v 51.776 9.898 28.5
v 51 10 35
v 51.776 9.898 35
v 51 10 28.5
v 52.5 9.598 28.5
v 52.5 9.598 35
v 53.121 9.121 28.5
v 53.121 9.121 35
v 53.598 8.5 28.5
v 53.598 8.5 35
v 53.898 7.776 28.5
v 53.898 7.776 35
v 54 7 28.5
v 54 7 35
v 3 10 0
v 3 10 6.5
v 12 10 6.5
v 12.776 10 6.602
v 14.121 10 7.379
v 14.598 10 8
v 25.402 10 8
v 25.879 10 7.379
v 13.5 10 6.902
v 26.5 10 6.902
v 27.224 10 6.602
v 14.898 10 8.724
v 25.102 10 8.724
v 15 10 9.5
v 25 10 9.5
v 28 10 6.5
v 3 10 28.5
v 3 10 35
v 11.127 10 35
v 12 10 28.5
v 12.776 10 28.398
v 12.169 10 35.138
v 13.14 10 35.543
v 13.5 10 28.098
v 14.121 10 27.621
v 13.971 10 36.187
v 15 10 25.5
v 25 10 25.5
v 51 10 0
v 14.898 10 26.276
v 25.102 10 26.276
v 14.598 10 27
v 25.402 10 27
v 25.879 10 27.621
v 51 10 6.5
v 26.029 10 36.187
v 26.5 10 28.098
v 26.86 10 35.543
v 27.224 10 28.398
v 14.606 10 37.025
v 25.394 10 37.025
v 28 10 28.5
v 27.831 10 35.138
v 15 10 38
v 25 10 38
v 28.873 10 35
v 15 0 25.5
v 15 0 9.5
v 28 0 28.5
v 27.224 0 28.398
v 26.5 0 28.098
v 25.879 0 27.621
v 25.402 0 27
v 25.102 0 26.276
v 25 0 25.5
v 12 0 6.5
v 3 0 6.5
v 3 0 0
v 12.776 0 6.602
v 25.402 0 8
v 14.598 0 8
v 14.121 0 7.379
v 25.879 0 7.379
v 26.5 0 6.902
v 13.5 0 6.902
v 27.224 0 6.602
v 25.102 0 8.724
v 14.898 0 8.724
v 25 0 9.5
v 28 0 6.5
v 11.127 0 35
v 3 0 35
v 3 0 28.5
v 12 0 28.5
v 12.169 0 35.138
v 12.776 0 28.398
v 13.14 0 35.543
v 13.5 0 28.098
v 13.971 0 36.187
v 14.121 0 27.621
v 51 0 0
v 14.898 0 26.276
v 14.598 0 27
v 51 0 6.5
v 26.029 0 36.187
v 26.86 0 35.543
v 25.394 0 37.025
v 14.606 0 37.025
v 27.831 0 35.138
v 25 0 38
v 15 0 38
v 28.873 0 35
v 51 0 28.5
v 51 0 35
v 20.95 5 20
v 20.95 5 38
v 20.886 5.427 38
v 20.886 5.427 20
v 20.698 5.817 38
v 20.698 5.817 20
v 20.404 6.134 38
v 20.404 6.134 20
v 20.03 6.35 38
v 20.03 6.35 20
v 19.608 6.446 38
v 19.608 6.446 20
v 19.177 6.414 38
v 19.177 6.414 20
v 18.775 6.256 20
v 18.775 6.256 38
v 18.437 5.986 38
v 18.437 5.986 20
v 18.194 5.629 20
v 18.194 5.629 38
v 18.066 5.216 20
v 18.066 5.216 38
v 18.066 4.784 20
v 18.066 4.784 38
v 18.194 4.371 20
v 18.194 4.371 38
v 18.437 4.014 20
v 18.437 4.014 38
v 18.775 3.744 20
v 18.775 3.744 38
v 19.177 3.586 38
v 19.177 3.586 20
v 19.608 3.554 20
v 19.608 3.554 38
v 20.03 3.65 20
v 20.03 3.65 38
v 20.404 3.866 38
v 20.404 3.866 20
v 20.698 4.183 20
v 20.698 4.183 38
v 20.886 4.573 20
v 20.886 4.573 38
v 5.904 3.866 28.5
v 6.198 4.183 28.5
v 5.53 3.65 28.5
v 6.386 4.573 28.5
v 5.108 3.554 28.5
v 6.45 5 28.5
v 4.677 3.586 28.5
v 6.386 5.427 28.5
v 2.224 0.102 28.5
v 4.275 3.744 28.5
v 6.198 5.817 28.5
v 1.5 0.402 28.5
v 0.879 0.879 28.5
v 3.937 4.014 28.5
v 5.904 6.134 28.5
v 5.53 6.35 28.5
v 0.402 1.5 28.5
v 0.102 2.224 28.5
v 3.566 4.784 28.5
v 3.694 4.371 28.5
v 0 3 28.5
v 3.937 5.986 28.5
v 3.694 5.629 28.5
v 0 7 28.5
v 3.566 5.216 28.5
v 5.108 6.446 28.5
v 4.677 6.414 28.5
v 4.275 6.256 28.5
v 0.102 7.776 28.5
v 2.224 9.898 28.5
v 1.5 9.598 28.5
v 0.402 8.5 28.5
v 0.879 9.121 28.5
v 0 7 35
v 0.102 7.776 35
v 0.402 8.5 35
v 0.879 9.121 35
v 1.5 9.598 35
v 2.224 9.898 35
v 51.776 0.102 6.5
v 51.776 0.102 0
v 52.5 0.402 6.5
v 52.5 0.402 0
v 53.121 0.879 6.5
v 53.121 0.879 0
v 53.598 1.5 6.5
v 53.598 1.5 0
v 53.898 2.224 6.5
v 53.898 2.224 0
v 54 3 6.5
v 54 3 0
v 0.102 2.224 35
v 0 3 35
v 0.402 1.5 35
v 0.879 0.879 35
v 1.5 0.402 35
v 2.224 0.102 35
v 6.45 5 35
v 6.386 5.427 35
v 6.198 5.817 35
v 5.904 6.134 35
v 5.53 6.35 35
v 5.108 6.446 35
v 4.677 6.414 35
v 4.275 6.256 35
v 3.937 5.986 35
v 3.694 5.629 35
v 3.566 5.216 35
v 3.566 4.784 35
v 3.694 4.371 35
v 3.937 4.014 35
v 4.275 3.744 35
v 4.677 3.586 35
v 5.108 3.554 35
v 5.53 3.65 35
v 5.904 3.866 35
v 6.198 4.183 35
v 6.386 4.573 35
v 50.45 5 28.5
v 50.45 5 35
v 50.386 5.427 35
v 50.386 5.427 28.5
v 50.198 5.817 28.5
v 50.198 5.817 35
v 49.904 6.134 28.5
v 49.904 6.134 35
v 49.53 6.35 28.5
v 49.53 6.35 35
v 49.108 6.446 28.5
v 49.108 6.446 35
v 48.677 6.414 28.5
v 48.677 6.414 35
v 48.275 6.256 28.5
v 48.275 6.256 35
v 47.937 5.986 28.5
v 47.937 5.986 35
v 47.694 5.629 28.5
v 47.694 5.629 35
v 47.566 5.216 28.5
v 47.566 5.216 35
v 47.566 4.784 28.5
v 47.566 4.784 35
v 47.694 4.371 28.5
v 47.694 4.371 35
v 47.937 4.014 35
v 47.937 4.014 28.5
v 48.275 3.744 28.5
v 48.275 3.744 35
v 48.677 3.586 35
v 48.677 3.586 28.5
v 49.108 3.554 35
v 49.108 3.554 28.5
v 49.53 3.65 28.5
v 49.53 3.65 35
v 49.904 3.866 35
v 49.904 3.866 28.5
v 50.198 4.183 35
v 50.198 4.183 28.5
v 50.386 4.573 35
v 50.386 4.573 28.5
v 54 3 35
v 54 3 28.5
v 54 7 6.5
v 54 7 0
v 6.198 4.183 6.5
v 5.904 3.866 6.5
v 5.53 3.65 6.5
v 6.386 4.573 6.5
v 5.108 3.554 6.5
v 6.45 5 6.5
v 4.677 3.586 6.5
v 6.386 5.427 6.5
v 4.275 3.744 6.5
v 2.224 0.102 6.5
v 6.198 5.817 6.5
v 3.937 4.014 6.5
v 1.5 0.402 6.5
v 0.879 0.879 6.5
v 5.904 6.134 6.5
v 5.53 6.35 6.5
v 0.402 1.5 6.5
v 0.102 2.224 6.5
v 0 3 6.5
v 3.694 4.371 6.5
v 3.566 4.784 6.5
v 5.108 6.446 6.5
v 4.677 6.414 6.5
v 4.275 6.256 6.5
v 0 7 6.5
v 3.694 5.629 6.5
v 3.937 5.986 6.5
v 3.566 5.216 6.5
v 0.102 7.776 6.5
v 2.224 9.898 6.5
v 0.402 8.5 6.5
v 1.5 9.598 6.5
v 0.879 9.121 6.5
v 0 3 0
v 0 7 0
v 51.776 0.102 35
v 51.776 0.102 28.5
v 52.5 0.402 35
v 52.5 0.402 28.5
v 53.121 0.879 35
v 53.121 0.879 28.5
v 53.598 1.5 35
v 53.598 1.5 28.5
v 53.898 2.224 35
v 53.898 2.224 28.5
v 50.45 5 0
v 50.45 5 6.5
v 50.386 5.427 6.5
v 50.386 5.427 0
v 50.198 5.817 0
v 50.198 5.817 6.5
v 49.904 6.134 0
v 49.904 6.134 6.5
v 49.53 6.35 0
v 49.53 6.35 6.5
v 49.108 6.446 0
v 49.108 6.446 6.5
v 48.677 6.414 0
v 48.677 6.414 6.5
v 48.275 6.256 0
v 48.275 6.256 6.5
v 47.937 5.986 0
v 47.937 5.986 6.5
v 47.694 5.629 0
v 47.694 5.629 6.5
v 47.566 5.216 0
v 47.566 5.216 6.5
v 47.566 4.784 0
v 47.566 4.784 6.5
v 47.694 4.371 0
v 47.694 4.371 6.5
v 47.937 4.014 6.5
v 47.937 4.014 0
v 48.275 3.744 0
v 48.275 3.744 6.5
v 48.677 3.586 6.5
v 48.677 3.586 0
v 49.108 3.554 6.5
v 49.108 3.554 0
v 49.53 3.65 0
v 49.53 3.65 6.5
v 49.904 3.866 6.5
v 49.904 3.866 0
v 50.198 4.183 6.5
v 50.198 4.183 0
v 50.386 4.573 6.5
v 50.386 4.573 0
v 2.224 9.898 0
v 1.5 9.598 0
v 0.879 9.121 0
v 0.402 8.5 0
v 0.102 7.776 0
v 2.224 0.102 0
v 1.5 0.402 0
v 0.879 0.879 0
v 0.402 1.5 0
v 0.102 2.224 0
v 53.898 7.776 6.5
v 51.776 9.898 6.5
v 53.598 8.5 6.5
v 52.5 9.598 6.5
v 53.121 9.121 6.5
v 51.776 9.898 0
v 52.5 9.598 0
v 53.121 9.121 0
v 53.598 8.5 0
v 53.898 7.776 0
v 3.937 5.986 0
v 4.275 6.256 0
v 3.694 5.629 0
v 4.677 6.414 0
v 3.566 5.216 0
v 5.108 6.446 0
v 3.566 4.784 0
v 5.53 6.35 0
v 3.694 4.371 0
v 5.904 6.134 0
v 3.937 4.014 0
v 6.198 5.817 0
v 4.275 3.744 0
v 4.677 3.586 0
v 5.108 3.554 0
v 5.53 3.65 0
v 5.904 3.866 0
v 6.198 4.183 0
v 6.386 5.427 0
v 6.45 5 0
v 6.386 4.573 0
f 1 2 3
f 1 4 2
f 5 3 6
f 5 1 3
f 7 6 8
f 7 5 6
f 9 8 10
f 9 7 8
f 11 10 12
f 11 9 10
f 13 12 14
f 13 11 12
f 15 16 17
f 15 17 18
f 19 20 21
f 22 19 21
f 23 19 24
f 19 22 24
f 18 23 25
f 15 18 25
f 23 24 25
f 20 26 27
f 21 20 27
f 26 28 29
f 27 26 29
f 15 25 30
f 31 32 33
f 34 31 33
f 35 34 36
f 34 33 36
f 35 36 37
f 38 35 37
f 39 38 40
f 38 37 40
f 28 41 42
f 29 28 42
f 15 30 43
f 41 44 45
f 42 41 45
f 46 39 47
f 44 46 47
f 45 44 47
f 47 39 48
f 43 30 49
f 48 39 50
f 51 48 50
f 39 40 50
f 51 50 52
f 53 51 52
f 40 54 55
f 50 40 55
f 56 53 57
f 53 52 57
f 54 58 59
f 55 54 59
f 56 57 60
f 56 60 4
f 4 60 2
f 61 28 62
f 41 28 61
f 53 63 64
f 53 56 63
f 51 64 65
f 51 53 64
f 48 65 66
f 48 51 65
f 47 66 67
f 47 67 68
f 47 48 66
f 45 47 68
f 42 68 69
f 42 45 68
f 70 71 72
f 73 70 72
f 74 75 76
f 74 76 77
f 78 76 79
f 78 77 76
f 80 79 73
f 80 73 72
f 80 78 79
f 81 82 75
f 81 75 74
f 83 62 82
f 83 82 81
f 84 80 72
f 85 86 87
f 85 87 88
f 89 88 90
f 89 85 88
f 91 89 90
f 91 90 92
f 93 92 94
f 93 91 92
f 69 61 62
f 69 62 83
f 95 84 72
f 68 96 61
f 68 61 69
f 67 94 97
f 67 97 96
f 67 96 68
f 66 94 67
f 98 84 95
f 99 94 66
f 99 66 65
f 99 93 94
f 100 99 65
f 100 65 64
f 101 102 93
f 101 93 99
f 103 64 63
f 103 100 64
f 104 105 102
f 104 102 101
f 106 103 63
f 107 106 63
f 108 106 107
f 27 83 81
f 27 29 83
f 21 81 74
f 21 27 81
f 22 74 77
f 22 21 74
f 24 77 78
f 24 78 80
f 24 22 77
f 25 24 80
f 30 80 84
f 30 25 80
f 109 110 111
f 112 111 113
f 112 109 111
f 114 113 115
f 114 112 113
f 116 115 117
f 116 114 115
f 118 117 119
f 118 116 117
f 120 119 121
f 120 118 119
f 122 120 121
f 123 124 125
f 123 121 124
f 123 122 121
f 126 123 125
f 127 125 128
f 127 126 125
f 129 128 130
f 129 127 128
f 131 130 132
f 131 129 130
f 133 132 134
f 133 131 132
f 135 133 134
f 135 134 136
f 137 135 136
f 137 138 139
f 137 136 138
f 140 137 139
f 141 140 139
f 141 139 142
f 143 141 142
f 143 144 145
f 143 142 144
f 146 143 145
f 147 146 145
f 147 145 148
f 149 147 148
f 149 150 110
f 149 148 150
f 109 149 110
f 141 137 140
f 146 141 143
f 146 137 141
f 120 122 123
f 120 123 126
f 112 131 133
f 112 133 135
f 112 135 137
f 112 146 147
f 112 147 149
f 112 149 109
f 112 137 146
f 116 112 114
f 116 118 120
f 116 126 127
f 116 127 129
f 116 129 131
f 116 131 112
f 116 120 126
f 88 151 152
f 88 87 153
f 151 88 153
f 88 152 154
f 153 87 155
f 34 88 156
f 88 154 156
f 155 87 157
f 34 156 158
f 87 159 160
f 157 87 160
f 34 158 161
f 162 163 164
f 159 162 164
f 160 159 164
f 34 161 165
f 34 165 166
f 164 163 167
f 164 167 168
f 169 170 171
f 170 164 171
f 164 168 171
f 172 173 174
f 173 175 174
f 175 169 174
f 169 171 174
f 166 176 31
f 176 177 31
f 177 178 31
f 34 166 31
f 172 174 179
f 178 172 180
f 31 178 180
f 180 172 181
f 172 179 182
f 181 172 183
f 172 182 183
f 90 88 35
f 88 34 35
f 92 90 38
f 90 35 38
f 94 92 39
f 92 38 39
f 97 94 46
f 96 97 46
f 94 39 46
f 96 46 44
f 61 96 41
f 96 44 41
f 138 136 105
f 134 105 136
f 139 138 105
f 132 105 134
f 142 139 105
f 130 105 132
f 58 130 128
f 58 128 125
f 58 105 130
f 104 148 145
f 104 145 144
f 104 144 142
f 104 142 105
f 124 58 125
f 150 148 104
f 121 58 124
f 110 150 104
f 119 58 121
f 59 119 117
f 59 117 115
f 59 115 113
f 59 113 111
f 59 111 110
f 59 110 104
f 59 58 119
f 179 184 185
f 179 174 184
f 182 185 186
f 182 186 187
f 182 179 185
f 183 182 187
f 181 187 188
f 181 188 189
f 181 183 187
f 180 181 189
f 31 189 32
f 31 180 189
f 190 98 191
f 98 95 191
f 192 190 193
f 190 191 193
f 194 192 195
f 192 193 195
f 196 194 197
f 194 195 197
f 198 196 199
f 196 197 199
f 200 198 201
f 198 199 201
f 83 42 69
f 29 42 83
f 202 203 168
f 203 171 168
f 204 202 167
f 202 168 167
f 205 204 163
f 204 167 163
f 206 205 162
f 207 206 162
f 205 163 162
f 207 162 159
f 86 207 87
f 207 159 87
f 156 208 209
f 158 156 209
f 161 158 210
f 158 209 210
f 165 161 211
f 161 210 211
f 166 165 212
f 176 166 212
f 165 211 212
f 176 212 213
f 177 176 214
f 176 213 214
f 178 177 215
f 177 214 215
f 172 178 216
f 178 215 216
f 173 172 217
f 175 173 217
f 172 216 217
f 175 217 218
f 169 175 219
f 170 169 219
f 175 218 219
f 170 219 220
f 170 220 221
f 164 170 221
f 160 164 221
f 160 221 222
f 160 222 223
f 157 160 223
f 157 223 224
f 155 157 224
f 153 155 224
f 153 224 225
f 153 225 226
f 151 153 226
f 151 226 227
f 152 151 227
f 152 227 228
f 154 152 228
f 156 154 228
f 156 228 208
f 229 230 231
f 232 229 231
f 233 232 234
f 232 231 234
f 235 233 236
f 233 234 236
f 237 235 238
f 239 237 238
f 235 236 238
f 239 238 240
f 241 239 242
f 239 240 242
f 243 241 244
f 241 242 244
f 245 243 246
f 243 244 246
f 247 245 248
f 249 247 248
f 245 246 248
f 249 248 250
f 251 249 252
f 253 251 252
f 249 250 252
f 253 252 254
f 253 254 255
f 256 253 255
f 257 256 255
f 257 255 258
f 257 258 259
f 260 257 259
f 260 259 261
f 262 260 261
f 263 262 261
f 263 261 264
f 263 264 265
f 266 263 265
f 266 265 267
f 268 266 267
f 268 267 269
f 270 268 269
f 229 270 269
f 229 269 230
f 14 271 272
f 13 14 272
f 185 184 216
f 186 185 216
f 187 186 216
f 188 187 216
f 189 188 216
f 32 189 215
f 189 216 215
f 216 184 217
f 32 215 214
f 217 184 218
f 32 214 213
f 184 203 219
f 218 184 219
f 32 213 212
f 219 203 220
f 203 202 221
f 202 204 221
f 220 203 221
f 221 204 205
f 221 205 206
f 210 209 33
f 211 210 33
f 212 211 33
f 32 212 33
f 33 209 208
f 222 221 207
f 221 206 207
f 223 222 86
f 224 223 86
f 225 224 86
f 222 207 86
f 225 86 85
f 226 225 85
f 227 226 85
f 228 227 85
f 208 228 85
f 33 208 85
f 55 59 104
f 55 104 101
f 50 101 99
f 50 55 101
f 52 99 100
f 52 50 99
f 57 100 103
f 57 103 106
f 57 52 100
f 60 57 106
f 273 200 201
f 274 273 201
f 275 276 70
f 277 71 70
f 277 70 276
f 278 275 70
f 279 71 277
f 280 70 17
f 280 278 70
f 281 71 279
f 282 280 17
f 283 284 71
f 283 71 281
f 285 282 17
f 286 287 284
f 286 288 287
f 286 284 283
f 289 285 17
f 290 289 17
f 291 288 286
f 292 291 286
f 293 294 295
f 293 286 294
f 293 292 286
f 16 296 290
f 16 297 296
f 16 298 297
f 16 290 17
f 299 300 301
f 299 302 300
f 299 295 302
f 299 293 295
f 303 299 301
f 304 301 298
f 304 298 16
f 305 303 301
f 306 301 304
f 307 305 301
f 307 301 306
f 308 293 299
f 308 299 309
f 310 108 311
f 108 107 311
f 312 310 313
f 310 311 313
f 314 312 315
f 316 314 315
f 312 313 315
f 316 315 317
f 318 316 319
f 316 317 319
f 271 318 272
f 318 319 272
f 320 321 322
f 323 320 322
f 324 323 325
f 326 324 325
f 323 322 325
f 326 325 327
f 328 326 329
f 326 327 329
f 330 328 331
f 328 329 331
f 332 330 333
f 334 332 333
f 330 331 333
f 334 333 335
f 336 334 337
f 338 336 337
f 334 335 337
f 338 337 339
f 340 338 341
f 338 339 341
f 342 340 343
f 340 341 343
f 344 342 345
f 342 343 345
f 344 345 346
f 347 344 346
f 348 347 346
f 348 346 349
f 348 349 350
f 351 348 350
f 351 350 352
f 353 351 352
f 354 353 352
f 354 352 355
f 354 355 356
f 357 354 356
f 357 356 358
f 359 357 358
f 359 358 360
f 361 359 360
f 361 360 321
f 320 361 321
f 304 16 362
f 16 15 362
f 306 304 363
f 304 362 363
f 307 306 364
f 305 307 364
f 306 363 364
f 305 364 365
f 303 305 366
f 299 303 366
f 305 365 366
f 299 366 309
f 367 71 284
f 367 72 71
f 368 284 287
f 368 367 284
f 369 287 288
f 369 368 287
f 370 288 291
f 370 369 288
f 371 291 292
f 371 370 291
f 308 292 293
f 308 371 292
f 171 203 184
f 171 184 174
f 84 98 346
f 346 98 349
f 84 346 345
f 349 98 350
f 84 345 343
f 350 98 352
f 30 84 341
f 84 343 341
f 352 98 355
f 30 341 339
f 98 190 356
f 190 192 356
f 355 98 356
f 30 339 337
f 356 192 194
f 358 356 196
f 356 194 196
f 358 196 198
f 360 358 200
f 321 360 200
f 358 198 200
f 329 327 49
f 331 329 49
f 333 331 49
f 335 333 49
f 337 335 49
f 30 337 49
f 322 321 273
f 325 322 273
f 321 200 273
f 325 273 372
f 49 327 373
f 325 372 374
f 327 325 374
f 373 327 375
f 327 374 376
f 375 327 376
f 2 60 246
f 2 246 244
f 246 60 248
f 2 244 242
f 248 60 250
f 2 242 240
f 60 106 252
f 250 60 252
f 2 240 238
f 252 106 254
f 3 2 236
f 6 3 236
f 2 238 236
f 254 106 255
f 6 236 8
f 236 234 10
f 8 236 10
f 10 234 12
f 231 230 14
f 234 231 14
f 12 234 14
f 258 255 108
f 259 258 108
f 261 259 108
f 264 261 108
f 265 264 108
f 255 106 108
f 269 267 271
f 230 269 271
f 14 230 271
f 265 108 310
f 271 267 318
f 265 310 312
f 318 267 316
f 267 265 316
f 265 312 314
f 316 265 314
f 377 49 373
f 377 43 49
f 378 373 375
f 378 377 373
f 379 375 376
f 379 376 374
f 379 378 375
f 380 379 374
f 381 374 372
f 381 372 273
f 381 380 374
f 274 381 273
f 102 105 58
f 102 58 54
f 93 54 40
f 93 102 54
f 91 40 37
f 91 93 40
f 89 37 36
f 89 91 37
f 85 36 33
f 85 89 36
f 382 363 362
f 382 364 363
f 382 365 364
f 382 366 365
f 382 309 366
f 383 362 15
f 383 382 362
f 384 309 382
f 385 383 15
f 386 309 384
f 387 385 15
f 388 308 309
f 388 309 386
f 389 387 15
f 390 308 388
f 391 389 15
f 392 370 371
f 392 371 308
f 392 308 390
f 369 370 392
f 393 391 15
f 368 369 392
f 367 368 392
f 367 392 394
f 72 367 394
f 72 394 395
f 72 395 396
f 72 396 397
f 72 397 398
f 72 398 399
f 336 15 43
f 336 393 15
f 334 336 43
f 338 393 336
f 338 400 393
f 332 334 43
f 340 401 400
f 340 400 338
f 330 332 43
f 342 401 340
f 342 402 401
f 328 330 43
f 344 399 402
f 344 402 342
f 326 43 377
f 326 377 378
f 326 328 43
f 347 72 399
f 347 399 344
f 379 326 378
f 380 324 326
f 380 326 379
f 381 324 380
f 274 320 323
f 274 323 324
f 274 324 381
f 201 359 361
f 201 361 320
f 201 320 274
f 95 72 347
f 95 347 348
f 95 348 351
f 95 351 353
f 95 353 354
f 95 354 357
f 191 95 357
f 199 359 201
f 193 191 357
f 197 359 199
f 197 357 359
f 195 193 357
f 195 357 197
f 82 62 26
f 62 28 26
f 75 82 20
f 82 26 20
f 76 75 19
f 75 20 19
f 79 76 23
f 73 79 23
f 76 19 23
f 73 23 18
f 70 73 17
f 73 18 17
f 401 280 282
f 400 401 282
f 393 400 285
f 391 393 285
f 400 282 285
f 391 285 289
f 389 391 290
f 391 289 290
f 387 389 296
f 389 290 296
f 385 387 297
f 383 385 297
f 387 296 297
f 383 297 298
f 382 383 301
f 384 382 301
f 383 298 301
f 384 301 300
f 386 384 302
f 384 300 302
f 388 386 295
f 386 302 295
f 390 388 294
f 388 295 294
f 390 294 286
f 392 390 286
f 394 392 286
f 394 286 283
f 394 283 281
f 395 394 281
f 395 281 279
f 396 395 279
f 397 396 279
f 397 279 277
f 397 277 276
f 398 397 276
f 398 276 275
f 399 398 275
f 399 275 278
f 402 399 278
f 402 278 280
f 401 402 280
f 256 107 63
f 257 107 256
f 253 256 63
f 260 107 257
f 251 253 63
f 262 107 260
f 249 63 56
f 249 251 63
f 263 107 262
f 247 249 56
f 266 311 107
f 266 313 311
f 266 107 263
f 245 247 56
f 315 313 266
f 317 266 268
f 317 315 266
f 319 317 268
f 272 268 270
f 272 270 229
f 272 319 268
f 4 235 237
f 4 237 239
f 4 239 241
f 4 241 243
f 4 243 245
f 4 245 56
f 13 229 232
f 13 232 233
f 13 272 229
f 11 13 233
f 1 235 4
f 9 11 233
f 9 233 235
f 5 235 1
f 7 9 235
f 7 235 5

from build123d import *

# Parameters (mm, degrees)
SKETCH1_W               = 54
SKETCH1_H               = 35
BOSS_EXTRUDE1_DEPTH     = 10
SKETCH2_W               = 22
SKETCH2_H               = 10
CUT_EXTRUDE1_DEPTH      = 29
SKETCH3_W               = 22
SKETCH3_H               = 10
CUT_EXTRUDE2_DEPTH      = 15
SKETCH5_R               = 1.45
CUT_EXTRUDE4_DEPTH      = 66.122960621
FILLET1_R               = 3
FILLET2_R               = 3
SKETCH8_W               = 10
SKETCH8_H               = 10
BOSS_EXTRUDE2_DEPTH     = 3
CUT_EXTRUDE5_DEPTH      = 4
CUT_EXTRUDE5_DEPTH_BACK = 15
SKETCH6_R               = 1.45
FILLET3_R               = 4


with BuildPart() as part:
    # Sketch1 → Boss-Extrude1 (new body)
    with BuildSketch(Plane(origin=(0, 0, 0), x_dir=(1, 0, 0), z_dir=(0, 1, 0))):
        with Locations((27, -17.5)):
            Rectangle(SKETCH1_W, SKETCH1_H)
    extrude(amount=BOSS_EXTRUDE1_DEPTH)

    # Sketch2 → Cut-Extrude1 (cut)
    with BuildSketch(Plane(origin=(54, 0, 0), x_dir=(0, 0, -1), z_dir=(1, 0, 0))):
        with Locations((-17.5, 5)):
            Rectangle(SKETCH2_W, SKETCH2_H)
    extrude(amount=-CUT_EXTRUDE1_DEPTH, mode=Mode.SUBTRACT)

    # Sketch3 → Cut-Extrude2 (cut)
    with BuildSketch(Plane.ZY):
        with Locations((17.5, 5)):
            Rectangle(SKETCH3_W, SKETCH3_H)
    extrude(amount=-CUT_EXTRUDE2_DEPTH, mode=Mode.SUBTRACT)

    # Sketch5 → Cut-Extrude4 (cut, through all)
    with BuildSketch(Plane.XY.offset(35)):
        with Locations((5, 5)):
            Circle(SKETCH5_R)
        with Locations((49, 5)):
            Circle(SKETCH5_R)
    extrude(amount=-CUT_EXTRUDE4_DEPTH, mode=Mode.SUBTRACT)

    # Fillet1
    fillet1_edges = [part.edges().sort_by_distance(p)[0] for p in [
        (54, 10, 31.75),
        (54, 0, 3.25),
        (54, 10, 3.25),
        (0, 0, 31.75),
        (0, 10, 31.75),
        (0, 10, 3.25),
        (54, 0, 31.75),
        (0, 0, 3.25),
    ]]
    fillet(fillet1_edges, radius=FILLET1_R)

    # Fillet2
    fillet2_edges = [part.edges().sort_by_distance(p)[0] for p in [
        (25, 5, 28.5),
        (25, 5, 6.5),
        (15, 5, 6.5),
        (15, 5, 28.5),
    ]]
    fillet(fillet2_edges, radius=FILLET2_R)

    # Sketch8 → Boss-Extrude2 (add)
    with BuildSketch(Plane.XY.offset(35)):
        with Locations((20, 5)):
            Rectangle(SKETCH8_W, SKETCH8_H)
    extrude(amount=BOSS_EXTRUDE2_DEPTH)

    # Sketch6 → Cut-Extrude5 (cut, two sides: drawn at the far end of the back side and taken through both)
    with BuildSketch(Plane.XY.offset(35).offset(-CUT_EXTRUDE5_DEPTH_BACK)):
        with Locations((19.5, 5)):
            Circle(SKETCH6_R)
    extrude(amount=CUT_EXTRUDE5_DEPTH + CUT_EXTRUDE5_DEPTH_BACK, mode=Mode.SUBTRACT)

    # Fillet3
    # the kernel refuses this fillet: 4 mm, written as the material it adds along each edge
    with BuildSketch(Plane(origin=(25, 10, 35), x_dir=(0, 0, 1), z_dir=(0, -1, 0))) as fillet3_piece_1:
        with BuildLine():
            CenterArc((4, -3.872983346), FILLET3_R, 104.477512186, 75.522487814)
            Line((0, -3.872983346), (-0.08, -3.872983346))
            Line((-0.08, -3.872983346), (-0.08, 0))
            Line((-0.08, 0), (0, 0.08))
            ThreePointArc((0, 0.08), (1.5, 0.08), (2.98, 0.077459667))
            Line((2.98, 0.077459667), (3, 0))
        make_face()
    extrude(amount=10)
    with BuildSketch(Plane(origin=(15, 0, 35), x_dir=(-1, 0, 0), z_dir=(0, 1, 0))) as fillet3_piece_2:
        with BuildLine():
            CenterArc((3.872983346, 4), FILLET3_R, 194.477512186, 75.522487814)
            Line((0, 3), (-0.077459667, 2.98))
            ThreePointArc((-0.077459667, 2.98), (-0.08, 1.5), (-0.08, 0))
            Line((-0.08, 0), (0, -0.08))
            Line((0, -0.08), (3.872983346, -0.08))
            Line((3.872983346, -0.08), (3.872983346, 0))
        make_face()
    extrude(amount=10)


solid = part.part
